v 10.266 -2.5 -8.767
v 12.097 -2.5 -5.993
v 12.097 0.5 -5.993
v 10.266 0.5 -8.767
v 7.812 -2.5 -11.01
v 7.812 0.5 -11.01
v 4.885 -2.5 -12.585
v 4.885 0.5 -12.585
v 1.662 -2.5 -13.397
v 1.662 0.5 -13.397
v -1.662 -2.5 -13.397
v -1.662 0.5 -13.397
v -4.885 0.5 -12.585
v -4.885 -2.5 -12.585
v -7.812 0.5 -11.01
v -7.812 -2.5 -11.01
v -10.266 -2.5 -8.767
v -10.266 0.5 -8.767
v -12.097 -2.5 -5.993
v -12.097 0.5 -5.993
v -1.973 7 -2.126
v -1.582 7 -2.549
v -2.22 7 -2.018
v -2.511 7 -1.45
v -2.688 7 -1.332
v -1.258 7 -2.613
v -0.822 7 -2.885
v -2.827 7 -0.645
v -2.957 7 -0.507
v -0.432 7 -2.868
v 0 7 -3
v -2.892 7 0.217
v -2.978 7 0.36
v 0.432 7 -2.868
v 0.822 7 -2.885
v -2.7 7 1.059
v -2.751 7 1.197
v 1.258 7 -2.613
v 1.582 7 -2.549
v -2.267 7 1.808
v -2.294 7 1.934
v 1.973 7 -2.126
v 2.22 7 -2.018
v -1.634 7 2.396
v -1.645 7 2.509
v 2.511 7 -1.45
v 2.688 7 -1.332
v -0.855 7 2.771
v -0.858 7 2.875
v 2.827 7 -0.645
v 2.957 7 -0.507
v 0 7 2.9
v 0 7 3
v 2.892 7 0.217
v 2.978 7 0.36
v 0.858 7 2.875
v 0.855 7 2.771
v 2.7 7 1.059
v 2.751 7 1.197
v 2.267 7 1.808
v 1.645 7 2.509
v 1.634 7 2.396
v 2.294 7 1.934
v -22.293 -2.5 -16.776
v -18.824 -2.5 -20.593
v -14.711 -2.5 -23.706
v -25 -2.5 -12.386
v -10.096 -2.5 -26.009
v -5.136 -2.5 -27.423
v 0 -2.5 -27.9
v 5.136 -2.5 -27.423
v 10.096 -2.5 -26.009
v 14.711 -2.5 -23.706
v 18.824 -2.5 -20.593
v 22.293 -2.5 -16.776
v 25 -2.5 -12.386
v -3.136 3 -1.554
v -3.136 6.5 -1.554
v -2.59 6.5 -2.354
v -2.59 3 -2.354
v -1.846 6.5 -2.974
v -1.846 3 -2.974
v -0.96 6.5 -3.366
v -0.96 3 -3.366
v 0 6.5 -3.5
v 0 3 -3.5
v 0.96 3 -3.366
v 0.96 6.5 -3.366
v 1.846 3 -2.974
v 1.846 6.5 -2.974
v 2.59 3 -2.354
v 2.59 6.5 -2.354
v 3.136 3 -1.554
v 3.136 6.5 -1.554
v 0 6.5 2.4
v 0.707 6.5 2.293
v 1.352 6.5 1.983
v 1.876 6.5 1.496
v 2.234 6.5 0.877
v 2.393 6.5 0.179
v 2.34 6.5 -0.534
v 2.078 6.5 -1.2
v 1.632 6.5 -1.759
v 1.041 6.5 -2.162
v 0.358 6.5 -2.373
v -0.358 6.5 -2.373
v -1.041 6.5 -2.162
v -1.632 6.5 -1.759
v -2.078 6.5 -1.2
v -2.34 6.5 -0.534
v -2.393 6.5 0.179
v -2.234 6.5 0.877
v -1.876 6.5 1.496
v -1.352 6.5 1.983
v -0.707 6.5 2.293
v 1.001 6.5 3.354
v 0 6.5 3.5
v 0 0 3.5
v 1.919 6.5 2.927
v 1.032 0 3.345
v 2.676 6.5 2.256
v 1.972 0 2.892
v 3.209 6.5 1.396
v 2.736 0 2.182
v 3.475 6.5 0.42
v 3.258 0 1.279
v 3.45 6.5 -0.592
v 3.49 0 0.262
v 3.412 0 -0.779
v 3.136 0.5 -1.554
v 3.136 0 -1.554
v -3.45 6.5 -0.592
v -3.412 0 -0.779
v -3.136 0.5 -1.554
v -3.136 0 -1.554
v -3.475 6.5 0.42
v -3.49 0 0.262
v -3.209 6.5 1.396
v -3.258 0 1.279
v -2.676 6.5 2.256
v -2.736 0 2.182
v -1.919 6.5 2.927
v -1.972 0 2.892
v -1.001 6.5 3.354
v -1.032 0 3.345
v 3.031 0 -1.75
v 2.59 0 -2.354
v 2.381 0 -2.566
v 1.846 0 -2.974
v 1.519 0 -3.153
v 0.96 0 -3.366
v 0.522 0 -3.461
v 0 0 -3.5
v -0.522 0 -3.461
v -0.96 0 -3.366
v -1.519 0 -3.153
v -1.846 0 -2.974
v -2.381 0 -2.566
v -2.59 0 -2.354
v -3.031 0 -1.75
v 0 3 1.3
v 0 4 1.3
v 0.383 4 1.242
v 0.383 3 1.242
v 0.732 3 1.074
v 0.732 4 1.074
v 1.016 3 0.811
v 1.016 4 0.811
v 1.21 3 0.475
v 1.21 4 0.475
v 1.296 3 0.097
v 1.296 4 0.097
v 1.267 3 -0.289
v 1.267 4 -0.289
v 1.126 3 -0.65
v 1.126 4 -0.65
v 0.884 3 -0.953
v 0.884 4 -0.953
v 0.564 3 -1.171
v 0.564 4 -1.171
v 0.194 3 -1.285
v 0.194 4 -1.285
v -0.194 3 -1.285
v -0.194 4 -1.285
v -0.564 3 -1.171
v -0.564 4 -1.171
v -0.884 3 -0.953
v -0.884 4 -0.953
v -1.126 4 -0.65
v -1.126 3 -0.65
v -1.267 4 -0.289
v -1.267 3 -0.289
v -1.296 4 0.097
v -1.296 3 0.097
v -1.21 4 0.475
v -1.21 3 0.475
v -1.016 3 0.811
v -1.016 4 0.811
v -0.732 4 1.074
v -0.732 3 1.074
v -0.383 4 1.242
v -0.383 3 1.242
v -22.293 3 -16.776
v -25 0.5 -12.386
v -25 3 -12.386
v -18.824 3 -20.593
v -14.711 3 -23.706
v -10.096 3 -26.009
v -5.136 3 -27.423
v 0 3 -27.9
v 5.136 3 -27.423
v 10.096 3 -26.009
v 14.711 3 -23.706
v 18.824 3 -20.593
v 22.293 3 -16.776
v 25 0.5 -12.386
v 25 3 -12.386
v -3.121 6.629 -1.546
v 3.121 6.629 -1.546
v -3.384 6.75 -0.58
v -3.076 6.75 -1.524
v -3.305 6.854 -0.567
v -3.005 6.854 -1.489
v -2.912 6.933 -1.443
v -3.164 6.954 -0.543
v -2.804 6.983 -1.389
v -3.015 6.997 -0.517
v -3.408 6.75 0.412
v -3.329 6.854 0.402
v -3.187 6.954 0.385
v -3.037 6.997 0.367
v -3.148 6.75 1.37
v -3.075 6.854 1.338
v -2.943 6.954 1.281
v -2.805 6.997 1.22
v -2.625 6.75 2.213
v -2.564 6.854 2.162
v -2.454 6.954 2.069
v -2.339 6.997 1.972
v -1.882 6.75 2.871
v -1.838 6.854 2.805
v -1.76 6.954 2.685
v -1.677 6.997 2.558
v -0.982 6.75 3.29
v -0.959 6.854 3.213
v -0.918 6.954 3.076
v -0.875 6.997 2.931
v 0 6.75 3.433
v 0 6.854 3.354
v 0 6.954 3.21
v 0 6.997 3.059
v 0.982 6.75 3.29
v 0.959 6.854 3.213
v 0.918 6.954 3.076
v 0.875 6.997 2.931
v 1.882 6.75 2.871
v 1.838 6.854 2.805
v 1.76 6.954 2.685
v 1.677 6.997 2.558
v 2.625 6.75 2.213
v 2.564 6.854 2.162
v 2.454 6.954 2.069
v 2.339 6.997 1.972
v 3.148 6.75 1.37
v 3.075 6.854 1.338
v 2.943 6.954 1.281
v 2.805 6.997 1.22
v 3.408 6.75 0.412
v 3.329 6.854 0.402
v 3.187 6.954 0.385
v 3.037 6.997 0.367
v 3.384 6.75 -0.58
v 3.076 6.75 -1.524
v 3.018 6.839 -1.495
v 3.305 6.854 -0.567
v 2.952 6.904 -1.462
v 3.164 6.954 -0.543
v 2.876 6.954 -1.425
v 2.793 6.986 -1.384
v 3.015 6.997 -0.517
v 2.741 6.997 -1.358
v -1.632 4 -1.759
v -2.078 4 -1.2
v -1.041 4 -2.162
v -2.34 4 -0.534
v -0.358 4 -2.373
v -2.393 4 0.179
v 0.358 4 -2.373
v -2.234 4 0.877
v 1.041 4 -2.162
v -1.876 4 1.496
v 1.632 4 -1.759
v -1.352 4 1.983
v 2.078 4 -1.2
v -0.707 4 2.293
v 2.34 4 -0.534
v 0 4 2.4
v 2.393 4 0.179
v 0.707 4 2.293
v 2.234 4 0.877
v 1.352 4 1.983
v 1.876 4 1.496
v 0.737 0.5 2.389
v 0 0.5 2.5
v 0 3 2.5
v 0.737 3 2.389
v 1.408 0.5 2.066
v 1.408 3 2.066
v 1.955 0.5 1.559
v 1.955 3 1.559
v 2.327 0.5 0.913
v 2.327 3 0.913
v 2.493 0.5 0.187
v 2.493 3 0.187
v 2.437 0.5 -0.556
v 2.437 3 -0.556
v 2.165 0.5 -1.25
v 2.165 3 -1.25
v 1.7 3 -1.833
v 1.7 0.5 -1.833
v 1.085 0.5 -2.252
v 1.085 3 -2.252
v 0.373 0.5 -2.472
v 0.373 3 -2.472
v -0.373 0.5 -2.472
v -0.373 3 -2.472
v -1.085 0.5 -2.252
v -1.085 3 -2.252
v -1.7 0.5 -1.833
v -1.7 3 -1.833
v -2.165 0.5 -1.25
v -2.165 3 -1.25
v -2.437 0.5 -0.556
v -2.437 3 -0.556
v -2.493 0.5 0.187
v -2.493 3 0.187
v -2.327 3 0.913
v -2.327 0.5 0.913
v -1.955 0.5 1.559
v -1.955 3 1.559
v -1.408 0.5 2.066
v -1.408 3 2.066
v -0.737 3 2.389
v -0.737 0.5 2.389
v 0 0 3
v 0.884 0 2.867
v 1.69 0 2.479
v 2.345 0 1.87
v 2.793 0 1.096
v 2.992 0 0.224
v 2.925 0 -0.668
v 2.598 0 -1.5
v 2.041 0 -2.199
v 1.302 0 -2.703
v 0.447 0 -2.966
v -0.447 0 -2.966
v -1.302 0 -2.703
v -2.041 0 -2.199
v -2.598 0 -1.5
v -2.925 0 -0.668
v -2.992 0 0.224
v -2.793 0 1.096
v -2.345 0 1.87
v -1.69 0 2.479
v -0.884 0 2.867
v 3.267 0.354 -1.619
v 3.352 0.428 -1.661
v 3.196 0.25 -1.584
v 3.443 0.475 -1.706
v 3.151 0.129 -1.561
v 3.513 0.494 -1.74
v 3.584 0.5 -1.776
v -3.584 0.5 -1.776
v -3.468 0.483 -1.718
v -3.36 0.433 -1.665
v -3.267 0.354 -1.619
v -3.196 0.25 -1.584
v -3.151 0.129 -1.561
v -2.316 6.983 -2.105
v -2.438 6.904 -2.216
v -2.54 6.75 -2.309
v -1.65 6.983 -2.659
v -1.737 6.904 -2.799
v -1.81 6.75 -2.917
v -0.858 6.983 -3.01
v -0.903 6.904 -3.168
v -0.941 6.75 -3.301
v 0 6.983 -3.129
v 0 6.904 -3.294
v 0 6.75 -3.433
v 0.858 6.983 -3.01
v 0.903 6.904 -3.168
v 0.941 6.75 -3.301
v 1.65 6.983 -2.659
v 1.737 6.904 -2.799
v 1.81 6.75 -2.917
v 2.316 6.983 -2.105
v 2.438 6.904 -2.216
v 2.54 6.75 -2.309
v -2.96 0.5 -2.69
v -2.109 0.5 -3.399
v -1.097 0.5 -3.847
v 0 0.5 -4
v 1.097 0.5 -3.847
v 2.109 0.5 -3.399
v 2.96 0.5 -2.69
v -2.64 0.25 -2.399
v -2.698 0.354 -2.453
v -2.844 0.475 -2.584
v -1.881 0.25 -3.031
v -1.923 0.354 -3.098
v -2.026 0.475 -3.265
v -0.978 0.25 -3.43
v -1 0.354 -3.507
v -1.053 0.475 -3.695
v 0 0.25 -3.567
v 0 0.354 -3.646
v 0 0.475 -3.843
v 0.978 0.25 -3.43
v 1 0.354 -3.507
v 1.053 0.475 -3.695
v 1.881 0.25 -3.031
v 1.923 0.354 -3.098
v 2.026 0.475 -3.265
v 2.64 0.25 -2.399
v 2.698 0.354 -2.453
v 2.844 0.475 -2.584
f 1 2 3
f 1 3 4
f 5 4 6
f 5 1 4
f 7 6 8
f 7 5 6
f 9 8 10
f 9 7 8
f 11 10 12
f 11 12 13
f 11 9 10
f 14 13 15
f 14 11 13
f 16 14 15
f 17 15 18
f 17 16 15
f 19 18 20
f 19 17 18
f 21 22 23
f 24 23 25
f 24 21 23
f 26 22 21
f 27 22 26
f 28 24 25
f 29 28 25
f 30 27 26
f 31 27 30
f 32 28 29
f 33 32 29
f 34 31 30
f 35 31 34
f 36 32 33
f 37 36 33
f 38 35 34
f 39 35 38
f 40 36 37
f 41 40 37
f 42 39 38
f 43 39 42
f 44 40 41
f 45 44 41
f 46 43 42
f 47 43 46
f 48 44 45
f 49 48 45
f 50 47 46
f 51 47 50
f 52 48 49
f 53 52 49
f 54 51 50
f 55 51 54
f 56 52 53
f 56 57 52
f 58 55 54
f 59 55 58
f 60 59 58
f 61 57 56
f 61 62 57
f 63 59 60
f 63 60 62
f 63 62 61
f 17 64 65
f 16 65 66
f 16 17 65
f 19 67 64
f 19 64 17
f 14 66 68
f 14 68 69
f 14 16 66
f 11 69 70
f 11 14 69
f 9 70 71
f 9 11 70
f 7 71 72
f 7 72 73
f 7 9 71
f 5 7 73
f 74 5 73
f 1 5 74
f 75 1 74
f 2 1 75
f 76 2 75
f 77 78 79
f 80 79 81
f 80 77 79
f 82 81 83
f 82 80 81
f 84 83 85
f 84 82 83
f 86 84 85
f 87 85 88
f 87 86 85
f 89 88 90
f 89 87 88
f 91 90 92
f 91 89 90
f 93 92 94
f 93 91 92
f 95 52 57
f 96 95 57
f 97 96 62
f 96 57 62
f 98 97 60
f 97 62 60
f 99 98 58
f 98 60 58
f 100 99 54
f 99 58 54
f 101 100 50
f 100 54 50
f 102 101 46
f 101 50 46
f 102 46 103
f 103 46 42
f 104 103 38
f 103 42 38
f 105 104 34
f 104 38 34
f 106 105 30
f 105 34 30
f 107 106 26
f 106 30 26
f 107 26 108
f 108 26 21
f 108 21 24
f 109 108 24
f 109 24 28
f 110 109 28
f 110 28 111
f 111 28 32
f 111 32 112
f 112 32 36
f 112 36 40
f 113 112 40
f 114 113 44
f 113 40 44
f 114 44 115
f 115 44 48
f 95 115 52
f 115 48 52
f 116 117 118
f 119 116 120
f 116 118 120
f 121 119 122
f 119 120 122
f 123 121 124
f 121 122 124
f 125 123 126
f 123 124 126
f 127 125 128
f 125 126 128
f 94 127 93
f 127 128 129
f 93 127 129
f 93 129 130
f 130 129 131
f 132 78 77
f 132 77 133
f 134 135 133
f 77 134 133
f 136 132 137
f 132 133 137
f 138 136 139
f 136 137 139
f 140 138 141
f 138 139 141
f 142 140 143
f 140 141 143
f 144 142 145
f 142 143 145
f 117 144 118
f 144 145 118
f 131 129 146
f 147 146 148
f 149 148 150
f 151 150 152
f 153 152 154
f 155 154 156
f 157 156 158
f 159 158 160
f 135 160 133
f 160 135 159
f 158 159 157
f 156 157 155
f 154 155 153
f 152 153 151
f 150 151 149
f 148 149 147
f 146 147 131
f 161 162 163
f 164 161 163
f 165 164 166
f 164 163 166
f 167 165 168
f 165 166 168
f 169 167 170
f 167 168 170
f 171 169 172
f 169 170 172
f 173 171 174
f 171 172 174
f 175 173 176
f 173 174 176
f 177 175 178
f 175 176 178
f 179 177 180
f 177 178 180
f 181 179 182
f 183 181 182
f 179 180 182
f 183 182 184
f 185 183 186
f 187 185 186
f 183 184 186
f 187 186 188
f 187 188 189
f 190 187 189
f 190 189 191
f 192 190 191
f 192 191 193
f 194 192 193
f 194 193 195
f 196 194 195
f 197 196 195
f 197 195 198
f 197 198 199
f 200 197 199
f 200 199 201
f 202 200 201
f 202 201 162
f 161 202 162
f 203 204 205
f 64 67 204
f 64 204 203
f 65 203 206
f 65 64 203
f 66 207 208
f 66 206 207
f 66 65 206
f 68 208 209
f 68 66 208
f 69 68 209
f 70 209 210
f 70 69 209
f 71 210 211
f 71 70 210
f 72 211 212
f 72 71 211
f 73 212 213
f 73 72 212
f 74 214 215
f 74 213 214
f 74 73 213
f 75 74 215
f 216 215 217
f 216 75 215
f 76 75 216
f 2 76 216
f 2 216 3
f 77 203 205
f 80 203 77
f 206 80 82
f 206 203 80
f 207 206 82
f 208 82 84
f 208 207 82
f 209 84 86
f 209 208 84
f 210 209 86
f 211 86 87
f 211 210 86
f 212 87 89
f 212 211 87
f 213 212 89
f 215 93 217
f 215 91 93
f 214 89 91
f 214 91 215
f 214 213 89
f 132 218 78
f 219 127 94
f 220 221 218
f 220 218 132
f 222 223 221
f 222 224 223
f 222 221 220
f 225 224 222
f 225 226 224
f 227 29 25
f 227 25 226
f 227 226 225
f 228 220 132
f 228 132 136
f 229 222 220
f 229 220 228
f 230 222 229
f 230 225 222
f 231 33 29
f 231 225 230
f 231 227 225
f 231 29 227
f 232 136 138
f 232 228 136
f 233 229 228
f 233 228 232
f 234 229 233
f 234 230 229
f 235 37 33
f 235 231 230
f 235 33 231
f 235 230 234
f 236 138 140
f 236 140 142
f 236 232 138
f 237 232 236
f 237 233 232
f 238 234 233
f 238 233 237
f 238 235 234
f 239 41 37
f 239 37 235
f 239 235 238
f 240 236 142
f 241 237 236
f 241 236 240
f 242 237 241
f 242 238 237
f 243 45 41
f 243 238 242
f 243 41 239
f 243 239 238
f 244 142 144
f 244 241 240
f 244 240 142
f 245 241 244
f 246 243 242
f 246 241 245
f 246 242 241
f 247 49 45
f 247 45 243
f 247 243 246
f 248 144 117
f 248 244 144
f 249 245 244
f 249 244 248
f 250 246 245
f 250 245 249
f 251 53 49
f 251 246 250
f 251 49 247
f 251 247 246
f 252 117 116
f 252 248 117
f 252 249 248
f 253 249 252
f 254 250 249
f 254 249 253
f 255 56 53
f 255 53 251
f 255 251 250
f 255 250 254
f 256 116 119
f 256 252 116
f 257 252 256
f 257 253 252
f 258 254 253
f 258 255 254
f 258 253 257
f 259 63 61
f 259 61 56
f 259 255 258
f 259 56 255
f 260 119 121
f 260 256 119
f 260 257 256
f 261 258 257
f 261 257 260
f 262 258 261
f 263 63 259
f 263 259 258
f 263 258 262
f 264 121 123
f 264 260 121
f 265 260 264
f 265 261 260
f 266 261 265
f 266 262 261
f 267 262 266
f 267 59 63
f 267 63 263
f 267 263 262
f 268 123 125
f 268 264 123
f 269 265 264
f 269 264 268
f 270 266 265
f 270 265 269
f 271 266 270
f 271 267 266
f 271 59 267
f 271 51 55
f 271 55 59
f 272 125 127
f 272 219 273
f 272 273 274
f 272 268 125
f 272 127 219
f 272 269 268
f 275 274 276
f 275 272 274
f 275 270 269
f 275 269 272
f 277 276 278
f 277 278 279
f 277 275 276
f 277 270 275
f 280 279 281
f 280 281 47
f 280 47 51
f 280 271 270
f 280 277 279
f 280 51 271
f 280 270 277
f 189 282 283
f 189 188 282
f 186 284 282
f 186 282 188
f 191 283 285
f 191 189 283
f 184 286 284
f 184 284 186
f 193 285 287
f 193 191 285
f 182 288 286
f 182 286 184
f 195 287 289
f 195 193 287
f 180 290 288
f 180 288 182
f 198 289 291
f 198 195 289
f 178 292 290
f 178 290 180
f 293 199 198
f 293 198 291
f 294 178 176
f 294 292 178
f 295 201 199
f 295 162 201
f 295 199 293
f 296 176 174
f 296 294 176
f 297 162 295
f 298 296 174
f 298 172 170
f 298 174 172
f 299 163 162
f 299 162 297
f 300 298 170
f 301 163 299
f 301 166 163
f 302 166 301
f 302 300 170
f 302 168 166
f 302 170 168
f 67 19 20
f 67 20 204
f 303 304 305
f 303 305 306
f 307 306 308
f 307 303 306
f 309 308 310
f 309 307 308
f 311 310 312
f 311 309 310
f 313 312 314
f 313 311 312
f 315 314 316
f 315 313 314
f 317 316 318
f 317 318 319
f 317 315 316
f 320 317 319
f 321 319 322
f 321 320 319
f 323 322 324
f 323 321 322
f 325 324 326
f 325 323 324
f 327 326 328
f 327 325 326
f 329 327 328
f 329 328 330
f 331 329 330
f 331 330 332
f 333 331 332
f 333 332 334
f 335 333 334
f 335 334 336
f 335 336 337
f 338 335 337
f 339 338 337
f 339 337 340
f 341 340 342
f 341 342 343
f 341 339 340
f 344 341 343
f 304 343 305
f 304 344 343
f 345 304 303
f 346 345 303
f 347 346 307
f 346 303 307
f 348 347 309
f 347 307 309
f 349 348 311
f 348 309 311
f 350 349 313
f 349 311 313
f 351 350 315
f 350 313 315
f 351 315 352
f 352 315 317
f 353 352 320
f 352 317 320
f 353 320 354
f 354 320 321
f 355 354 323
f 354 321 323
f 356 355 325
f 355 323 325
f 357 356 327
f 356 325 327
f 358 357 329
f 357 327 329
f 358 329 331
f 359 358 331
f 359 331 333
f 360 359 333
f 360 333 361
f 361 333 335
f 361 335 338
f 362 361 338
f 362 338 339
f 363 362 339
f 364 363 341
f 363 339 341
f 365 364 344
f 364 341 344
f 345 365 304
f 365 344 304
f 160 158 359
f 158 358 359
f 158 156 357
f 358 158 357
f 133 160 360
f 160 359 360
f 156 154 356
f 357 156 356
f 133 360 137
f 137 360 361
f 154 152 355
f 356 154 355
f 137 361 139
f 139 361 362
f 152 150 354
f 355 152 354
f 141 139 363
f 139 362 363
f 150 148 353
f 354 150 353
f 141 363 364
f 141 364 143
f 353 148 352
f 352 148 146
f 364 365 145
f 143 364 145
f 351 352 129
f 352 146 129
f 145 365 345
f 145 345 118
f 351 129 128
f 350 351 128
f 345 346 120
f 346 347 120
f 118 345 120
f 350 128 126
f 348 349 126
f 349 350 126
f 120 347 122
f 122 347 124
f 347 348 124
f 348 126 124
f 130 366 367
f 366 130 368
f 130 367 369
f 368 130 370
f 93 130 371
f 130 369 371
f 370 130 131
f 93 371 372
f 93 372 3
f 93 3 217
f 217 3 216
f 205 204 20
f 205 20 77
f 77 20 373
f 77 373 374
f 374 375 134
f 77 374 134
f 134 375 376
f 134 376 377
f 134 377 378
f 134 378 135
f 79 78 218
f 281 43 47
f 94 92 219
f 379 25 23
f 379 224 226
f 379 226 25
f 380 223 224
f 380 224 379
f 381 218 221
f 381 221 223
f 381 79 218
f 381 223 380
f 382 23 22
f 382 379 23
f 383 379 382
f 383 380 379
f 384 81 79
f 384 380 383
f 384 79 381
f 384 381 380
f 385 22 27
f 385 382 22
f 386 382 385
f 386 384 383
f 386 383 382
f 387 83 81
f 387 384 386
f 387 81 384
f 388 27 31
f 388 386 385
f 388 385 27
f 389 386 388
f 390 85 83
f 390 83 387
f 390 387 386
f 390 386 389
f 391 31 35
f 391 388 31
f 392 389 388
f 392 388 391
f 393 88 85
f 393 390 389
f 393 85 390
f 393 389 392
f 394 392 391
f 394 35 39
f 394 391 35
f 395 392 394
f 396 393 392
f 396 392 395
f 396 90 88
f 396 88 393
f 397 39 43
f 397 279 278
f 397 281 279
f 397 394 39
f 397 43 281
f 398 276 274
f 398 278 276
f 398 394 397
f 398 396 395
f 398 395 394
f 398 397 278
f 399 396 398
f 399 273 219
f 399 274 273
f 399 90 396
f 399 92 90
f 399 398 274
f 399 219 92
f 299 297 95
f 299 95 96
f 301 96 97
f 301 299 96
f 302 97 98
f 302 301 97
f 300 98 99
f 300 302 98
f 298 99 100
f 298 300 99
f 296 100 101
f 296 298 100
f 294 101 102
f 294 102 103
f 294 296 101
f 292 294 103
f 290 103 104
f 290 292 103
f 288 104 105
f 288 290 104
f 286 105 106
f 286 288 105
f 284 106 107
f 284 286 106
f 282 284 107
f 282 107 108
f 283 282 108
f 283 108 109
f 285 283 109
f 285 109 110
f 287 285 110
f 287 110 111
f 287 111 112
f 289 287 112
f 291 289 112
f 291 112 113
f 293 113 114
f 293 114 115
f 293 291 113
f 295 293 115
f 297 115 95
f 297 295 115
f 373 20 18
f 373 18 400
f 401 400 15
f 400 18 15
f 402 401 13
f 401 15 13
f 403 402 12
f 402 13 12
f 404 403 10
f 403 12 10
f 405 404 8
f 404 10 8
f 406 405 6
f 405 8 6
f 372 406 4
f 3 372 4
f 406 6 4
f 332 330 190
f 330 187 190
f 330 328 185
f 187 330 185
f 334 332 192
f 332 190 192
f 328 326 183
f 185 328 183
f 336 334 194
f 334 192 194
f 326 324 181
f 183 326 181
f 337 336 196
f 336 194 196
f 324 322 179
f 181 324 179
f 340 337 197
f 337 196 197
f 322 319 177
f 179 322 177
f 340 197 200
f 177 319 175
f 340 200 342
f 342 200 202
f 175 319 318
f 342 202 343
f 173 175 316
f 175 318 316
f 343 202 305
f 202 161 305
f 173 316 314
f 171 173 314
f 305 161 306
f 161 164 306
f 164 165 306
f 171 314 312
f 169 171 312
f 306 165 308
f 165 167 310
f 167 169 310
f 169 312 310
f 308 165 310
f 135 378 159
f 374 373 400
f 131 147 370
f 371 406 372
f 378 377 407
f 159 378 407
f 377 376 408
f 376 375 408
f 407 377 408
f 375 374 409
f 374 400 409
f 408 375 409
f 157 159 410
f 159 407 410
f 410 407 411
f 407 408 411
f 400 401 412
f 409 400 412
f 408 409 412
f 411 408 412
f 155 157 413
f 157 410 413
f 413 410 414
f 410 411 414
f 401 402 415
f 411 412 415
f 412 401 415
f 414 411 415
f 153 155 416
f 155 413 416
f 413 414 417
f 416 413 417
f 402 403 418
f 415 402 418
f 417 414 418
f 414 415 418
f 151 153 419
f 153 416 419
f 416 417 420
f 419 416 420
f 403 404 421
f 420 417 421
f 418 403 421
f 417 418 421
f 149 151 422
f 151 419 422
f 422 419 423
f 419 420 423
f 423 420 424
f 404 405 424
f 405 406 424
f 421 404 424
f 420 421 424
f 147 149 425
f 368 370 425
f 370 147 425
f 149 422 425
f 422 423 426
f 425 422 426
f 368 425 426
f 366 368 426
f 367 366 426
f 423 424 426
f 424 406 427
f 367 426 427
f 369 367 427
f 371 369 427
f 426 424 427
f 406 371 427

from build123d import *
from build123d.topology import SkipClean

# Parameters (mm, degrees)
SKETCH1_R                = 3.5
SKETCH1_R_2              = 2.5
BOSS_EXTRUDE1_DEPTH      = 3
SKETCH2_R                = 3.5
BOSS_EXTRUDE2_DEPTH      = 1
CUT_EXTRUDE1_REACH       = 8.364
SKETCH3_R                = 1.3
SKETCH4_R                = 3.5
SKETCH4_R_2              = 2.4
BOSS_EXTRUDE3_DEPTH      = 3
CHAMFER1_SIZE            = 0.5
BOSS_EXTRUDE5_DEPTH      = 3.5
BOSS_EXTRUDE5_DEPTH_BACK = 3
FILLET1_R                = 0.5
BOSS_EXTRUDE6_START      = 3
BOSS_EXTRUDE6_DEPTH      = 3
CUT_EXTRUDE2_START       = -4
CUT_EXTRUDE2_DEPTH       = 4
FILLET3_R                = 0.5


# Some blends are built 0.0001 mm under size
with BuildPart() as part:
    # Sketch1 → Boss-Extrude1 (new body)
    with BuildSketch(Plane(origin=(0, 0, 0), x_dir=(1, 0, 0), z_dir=(0, 1, 0))):
        with Locations(Location((0, 0, 0), (0, 0, 270))):
            Circle(SKETCH1_R)
        with Locations(Location((0, 0, 0), (0, 0, 270))):
            Circle(SKETCH1_R_2, mode=Mode.SUBTRACT)
    extrude(amount=BOSS_EXTRUDE1_DEPTH)

    # Sketch2 → Boss-Extrude2 (add)
    with BuildSketch(Plane(origin=(0, 3, 0), x_dir=(1, 0, 0), z_dir=(0, 1, 0))):
        with Locations(Location((0, 0, 0), (0, 0, 270))):
            Circle(SKETCH2_R)
    extrude(amount=BOSS_EXTRUDE2_DEPTH)

    # Sketch3 → Cut-Extrude1 (cut, up to next)
    with BuildSketch(Plane(origin=(0, 4, 0), x_dir=(1, 0, 0), z_dir=(0, 1, 0)), mode=Mode.PRIVATE) as cut_extrude1_sk1:
        with Locations(Location((0, 0, 0), (0, 0, 270))):
            Circle(SKETCH3_R)
    cut_extrude1_tool1 = extrude(cut_extrude1_sk1.sketch, amount=-CUT_EXTRUDE1_REACH, mode=Mode.PRIVATE) & part.part
    add(cut_extrude1_tool1.solids().sort_by_distance((0, 4, 0))[0], mode=Mode.SUBTRACT)

    # Sketch4 → Boss-Extrude3 (add)
    with BuildSketch(Plane(origin=(0, 4, 0), x_dir=(1, 0, 0), z_dir=(0, 1, 0))):
        with Locations(Location((0, 0, 0), (0, 0, 270))):
            Circle(SKETCH4_R)
        with Locations(Location((0, 0, 0), (0, 0, 270))):
            Circle(SKETCH4_R_2, mode=Mode.SUBTRACT)
    extrude(amount=BOSS_EXTRUDE3_DEPTH)

    # Chamfer1
    chamfer1_edges = [part.edges().sort_by_distance(p)[0] for p in [
        (0, 7, -2.4),
        (0, 0, -2.5),
    ]]
    chamfer(chamfer1_edges, length=CHAMFER1_SIZE)

    # Sketch6 → Boss-Extrude5 (add, two sides: drawn at the far end of the back side and taken through both)
    with BuildSketch(Plane(origin=(0, 3.5, 0), x_dir=(1, 0, 0), z_dir=(0, 1, 0)).offset(-BOSS_EXTRUDE5_DEPTH_BACK)):
        with BuildLine():
            Line((-25, 12.385879056), (-3.136200717, 1.553784111))
            ThreePointArc((-3.136200717, 1.553784111), (0, 3.5), (3.136200717, 1.553784111))
            Line((3.136200717, 1.553784111), (25, 12.385879056))
            ThreePointArc((25, 12.385879056), (0, 27.9), (-25, 12.385879056))
        make_face()
    extrude(amount=BOSS_EXTRUDE5_DEPTH + BOSS_EXTRUDE5_DEPTH_BACK)

    # Fillet1
    fillet1_edges = [part.edges().sort_by_distance(p)[0] for p in [
        (-2.973906891, 7, 1.845502047),
        (0, 0.5, -3.5),
    ]]
    fillet(fillet1_edges, radius=FILLET1_R - 0.0001)  # a hair under: the kernel refuses the full size

    # Sketch7 → Boss-Extrude6 (add)
    with BuildSketch(Plane.XZ.offset(-0.5).offset(BOSS_EXTRUDE6_START)):
        with BuildLine():
            Line((25, -12.385879056), (12.096774194, -5.993167285))
            ThreePointArc((12.096774194, -5.993167285), (0, -13.5), (-12.096774194, -5.993167285))
            Line((-12.096774194, -5.993167285), (-25, -12.385879056))
            ThreePointArc((-25, -12.385879056), (0, -27.9), (25, -12.385879056))
        make_face()
    extrude(amount=-BOSS_EXTRUDE6_DEPTH)

    # Sketch8 → Cut-Extrude2 (cut)
    with SkipClean():  # the faces are left unmerged after this step: merging them gives an invalid solid
        with BuildSketch(Plane(origin=(0, 7, 0), x_dir=(1, 0, 0), z_dir=(0, 1, 0)).offset(CUT_EXTRUDE2_START)):
            with BuildLine():
                Line((3.136200717, 1.553784111), (25, 12.385879056))
                ThreePointArc((25, 12.385879056), (0, 27.9), (-25, 12.385879056))
                Line((-25, 12.385879056), (-3.136200717, 1.553784111))
                ThreePointArc((-3.136200717, 1.553784111), (0, 3.5), (3.136200717, 1.553784111))
            make_face()
        extrude(amount=CUT_EXTRUDE2_DEPTH, mode=Mode.SUBTRACT)

    # Fillet3
    # the kernel refuses this fillet: 0.5 mm, written as the material it takes off along each edge
    with BuildSketch(Plane(origin=(0, 7, 0), x_dir=(-0.8960573476702508, 0, -0.44393831743402734), z_dir=(-0.44393831743402734, 0, 0.8960573476702508))) as fillet3_piece_1:
        with BuildLine():
            CenterArc((3.5 - FILLET3_R, FILLET3_R), FILLET3_R, 270, 90)
            Line((3.5, FILLET3_R), (3.5 + FILLET3_R * 0.02, FILLET3_R))
            Line((3.5 + FILLET3_R * 0.02, FILLET3_R), (3.5 + FILLET3_R * 0.02, -FILLET3_R * 0.02))
            Line((3.5 + FILLET3_R * 0.02, -FILLET3_R * 0.02), (3.5 - FILLET3_R, -FILLET3_R * 0.02))
            Line((3.5 - FILLET3_R, -FILLET3_R * 0.02), (3.5 - FILLET3_R, 0))
        make_face()
    revolve(axis=Axis((0, 7, 0), (0, -1, 0)), revolution_arc=127.289134778, mode=Mode.SUBTRACT)


solid = part.part
